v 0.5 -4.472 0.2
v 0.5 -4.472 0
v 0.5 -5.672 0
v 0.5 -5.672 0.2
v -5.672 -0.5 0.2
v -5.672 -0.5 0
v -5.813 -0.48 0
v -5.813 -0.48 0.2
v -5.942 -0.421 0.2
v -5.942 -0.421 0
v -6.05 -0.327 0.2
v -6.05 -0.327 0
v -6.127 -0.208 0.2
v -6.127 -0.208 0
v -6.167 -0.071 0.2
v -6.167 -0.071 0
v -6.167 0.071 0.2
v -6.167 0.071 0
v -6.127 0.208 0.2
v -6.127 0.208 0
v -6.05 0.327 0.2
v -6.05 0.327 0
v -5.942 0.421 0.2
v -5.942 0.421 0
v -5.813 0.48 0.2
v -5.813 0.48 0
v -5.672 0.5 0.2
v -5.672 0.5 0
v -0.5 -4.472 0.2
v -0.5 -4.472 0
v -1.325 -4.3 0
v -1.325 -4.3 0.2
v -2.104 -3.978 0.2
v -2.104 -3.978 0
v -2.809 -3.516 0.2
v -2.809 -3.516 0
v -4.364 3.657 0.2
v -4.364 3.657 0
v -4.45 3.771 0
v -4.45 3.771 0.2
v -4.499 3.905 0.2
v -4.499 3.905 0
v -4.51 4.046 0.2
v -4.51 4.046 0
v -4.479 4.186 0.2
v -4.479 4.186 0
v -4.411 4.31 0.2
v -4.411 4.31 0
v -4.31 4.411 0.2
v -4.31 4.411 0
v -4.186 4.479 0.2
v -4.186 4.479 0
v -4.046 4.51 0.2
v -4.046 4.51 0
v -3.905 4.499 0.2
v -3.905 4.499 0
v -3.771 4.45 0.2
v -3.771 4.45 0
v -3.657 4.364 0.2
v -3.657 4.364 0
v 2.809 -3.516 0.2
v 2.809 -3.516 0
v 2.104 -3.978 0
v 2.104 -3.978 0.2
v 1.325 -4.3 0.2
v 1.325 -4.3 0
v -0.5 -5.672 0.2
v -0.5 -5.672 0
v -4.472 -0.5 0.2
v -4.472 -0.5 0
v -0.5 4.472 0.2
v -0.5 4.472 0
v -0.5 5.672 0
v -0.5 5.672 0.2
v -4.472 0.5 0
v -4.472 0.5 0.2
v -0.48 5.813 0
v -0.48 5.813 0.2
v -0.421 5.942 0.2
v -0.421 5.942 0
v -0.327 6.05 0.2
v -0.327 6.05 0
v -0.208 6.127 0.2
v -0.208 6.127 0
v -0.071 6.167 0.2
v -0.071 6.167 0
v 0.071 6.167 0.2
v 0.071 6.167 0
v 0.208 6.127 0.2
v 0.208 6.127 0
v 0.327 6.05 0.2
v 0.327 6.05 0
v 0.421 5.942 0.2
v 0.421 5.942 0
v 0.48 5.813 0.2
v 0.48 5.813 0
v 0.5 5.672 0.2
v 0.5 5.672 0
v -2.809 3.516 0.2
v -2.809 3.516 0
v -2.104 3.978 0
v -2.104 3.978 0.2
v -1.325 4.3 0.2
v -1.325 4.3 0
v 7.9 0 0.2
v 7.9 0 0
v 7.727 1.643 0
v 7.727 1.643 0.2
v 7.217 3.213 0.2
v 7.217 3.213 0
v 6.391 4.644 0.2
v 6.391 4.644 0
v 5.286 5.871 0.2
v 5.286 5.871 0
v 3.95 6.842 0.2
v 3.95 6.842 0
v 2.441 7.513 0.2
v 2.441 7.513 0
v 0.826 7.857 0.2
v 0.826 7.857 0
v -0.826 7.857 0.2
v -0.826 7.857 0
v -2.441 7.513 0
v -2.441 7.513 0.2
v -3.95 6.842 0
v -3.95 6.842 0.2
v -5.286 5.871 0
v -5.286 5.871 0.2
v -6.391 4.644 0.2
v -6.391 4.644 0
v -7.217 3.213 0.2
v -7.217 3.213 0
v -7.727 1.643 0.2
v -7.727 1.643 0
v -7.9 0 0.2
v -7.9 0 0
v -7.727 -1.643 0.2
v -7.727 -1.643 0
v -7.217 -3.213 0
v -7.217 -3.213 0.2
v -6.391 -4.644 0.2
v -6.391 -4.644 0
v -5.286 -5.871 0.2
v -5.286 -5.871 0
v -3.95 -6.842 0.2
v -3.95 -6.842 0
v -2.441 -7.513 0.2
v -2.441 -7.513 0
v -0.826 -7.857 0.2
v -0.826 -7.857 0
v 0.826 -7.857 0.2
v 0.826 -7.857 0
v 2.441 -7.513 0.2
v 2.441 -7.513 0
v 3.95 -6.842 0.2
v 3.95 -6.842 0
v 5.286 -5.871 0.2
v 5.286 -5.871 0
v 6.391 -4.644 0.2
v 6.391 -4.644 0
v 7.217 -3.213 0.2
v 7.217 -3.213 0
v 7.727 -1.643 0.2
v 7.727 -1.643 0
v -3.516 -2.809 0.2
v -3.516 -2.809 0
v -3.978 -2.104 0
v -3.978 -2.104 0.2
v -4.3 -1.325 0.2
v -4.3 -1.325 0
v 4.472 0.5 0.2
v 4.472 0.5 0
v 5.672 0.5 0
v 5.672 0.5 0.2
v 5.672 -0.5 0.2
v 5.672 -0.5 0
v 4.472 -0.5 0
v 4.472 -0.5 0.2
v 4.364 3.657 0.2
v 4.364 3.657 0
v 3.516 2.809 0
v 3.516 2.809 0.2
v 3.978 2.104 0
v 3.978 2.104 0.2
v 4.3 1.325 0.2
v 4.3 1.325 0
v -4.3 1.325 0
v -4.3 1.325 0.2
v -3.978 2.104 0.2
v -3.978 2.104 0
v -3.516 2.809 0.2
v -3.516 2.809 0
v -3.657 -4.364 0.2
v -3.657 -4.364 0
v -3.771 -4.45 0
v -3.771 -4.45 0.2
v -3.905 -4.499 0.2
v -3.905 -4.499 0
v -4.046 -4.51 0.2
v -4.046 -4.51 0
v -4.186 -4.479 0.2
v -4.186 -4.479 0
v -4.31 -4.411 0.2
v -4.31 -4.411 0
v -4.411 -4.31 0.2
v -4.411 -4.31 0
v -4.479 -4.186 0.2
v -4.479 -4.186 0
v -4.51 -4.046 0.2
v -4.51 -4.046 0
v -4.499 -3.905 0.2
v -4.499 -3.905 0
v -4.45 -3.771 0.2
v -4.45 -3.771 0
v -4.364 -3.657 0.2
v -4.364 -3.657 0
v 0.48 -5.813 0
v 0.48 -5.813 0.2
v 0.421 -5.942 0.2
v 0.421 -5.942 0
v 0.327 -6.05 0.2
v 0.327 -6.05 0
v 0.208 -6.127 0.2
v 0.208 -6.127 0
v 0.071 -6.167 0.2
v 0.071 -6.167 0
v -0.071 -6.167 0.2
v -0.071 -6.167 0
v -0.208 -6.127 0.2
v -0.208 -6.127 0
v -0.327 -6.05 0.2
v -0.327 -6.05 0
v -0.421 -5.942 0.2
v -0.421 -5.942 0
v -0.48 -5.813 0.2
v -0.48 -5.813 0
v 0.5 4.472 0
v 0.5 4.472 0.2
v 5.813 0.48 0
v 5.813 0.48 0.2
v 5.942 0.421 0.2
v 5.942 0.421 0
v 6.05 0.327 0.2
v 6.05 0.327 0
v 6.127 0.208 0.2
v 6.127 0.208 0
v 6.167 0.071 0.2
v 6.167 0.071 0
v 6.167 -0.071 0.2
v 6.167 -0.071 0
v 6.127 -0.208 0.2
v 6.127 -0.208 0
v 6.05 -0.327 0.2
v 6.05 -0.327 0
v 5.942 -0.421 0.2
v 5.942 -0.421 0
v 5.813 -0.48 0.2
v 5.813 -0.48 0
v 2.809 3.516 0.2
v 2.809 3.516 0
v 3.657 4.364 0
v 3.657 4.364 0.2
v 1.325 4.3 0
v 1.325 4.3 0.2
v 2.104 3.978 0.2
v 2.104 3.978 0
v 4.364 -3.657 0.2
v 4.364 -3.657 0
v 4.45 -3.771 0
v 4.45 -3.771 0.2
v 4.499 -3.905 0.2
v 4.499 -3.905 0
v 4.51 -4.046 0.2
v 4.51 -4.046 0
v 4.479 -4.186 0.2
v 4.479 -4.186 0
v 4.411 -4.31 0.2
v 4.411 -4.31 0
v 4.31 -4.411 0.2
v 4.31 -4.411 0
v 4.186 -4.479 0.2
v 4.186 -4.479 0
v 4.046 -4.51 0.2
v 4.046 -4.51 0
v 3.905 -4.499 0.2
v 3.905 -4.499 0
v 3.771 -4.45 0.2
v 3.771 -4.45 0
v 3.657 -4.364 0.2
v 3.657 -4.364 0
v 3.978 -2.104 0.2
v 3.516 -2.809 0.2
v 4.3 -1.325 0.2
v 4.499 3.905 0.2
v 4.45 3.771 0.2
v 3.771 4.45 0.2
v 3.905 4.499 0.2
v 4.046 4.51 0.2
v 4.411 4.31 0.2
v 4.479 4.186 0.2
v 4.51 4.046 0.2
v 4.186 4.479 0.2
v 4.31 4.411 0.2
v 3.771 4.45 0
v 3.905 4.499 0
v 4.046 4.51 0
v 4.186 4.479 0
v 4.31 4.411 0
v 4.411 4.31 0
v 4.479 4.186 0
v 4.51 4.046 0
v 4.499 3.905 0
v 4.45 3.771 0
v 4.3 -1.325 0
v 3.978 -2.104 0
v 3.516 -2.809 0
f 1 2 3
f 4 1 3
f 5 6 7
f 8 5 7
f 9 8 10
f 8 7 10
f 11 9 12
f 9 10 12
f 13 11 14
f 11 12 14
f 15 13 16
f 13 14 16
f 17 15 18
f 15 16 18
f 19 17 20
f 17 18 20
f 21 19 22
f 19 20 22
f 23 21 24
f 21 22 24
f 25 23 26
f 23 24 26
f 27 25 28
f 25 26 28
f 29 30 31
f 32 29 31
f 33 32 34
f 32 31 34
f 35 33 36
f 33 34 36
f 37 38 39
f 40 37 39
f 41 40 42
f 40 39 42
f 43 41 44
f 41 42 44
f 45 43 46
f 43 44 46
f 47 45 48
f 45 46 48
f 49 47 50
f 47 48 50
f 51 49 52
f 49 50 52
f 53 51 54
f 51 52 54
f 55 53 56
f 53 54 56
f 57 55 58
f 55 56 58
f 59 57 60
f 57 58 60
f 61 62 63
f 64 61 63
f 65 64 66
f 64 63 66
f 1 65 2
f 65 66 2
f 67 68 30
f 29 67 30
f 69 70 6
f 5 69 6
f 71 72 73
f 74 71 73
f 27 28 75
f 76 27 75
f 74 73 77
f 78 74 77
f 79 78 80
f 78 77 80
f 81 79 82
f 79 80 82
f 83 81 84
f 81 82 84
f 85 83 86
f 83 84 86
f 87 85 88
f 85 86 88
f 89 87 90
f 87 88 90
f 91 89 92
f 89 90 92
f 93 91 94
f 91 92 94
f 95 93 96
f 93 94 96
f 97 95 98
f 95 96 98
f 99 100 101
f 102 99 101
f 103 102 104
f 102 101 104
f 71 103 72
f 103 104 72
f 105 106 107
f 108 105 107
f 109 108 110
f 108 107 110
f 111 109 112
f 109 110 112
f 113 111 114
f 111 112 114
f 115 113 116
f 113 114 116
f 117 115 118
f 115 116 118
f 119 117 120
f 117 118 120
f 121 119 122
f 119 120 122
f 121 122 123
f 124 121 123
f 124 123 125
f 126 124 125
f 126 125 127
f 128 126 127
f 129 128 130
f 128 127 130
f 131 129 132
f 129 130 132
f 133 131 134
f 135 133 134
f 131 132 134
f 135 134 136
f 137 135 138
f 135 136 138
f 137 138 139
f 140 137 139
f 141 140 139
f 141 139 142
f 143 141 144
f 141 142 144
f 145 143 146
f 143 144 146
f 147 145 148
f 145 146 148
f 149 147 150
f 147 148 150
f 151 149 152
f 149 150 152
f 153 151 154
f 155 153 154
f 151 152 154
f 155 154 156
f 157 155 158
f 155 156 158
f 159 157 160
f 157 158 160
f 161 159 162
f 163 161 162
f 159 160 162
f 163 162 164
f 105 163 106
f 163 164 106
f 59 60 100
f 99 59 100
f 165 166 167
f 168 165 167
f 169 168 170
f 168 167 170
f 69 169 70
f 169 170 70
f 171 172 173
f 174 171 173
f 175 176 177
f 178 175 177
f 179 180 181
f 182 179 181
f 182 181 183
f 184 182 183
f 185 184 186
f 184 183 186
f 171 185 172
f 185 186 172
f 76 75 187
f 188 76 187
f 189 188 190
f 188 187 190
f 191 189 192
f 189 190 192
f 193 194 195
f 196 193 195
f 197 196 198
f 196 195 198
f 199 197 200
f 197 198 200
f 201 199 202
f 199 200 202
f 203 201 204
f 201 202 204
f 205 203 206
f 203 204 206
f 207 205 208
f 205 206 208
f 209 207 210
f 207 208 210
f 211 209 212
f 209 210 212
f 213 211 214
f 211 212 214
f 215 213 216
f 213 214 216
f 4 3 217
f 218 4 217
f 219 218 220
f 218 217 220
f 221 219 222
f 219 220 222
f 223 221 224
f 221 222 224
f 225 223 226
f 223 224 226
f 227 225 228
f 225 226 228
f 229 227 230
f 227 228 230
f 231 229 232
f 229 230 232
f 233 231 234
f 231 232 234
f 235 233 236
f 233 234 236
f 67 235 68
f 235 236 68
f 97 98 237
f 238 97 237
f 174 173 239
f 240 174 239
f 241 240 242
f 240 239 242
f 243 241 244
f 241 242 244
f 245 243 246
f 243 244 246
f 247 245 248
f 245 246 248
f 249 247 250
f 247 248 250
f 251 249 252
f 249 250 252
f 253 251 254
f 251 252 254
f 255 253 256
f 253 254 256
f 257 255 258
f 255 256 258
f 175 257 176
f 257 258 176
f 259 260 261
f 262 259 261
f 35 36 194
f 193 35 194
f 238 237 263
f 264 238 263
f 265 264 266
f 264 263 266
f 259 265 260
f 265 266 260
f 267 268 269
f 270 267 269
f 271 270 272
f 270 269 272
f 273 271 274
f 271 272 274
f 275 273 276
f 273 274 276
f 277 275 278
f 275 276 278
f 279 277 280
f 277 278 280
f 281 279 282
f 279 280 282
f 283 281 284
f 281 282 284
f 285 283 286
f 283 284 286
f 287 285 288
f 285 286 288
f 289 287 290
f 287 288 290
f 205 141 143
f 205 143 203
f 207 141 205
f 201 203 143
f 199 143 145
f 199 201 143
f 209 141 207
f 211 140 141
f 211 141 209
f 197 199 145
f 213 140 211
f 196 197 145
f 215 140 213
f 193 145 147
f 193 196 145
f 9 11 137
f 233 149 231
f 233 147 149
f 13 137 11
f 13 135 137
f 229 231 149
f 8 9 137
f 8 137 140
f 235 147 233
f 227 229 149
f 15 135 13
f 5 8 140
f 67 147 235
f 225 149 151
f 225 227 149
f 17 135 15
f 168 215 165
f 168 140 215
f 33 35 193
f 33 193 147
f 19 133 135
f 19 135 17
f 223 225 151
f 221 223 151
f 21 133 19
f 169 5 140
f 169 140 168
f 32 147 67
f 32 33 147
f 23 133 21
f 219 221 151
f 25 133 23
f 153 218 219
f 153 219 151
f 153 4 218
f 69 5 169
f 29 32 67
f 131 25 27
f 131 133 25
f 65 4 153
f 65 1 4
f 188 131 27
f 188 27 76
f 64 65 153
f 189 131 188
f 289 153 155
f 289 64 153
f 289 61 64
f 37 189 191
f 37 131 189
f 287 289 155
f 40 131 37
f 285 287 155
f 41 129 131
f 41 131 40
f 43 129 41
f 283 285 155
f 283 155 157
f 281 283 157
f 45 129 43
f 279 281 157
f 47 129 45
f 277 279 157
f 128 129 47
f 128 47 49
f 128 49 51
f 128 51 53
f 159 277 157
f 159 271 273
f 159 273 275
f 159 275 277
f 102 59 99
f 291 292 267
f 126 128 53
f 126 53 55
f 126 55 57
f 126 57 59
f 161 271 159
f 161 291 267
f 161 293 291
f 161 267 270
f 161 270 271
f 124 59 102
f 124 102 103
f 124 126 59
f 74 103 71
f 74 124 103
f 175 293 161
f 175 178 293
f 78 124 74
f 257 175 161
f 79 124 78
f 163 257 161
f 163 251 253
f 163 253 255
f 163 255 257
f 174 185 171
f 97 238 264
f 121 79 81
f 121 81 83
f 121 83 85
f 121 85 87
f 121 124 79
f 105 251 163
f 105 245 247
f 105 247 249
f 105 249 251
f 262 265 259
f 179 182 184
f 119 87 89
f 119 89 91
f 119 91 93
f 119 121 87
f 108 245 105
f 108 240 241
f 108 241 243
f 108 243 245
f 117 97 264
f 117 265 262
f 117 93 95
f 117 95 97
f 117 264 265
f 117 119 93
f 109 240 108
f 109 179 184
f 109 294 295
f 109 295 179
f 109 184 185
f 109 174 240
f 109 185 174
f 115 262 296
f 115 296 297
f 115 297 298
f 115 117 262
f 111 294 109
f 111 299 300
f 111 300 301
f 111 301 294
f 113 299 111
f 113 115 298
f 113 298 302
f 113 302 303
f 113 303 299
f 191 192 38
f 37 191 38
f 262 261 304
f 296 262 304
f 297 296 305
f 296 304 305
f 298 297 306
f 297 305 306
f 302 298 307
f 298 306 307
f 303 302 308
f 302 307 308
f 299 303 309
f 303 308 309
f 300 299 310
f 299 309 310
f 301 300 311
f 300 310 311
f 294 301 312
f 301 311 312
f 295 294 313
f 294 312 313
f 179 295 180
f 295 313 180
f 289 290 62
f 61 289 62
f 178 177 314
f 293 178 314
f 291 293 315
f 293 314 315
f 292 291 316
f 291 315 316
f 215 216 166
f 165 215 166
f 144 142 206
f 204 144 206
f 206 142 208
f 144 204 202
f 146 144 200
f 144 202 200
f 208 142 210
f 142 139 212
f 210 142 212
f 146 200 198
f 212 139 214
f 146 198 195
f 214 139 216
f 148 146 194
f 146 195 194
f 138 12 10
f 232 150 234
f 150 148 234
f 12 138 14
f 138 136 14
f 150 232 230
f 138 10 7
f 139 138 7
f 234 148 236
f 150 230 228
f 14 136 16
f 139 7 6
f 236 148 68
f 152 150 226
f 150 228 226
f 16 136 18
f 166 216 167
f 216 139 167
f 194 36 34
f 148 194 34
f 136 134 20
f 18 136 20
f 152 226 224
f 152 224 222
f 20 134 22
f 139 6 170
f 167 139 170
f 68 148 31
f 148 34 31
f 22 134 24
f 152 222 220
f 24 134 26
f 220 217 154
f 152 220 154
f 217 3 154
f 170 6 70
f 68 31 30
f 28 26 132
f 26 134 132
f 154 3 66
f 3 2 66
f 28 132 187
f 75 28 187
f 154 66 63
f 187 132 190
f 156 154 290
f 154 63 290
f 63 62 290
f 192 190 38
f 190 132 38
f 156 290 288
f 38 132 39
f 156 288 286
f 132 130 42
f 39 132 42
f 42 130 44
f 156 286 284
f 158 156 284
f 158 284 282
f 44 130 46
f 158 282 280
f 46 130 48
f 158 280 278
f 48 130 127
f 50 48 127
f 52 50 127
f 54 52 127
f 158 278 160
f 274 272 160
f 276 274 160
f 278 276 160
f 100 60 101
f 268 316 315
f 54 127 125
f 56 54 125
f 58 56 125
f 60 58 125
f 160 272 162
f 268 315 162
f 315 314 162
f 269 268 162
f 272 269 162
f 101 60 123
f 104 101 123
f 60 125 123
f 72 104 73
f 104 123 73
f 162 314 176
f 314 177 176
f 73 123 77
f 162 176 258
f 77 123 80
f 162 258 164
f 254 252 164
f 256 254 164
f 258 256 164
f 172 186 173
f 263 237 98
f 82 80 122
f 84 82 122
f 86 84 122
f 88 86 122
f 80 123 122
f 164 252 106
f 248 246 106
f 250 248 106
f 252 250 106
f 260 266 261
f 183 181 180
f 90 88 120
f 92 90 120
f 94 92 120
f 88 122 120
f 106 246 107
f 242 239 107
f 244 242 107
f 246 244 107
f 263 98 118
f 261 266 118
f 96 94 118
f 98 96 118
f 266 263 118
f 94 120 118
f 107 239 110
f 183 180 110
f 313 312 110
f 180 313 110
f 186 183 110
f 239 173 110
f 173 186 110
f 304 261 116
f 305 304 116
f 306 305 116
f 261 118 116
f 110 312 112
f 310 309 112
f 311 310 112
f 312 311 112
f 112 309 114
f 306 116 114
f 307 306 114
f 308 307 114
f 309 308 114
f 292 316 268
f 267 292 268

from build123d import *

# Parameters (mm, degrees)
F0_R     = 7.9
F1_DEPTH = 0.2


with BuildPart() as f1:
    # F0 (on Top) → F1 (new body)
    with BuildSketch(Plane.XY):
        Circle(F0_R)
        with BuildLine():
            ThreePointArc((-2.808724, 3.515831), (-1.722075, 4.157458), (-0.5, 4.472136))
            Line((-0.5, 4.472136), (-0.5, 5.672136))
            ThreePointArc((-0.5, 5.672136), (0, 6.172136), (0.5, 5.672136))
            Line((0.5, 5.672136), (0.5, 4.472136))
            ThreePointArc((0.5, 4.472136), (1.722075, 4.157458), (2.808724, 3.515831))
            Line((2.808724, 3.515831), (3.657252, 4.364359))
            ThreePointArc((3.657252, 4.364359), (4.364359, 4.364359), (4.364359, 3.657252))
            Line((4.364359, 3.657252), (3.515831, 2.808724))
            ThreePointArc((3.515831, 2.808724), (4.157458, 1.722075), (4.472136, 0.5))
            Line((4.472136, 0.5), (5.672136, 0.5))
            ThreePointArc((5.672136, 0.5), (6.172136, 0), (5.672136, -0.5))
            Line((5.672136, -0.5), (4.472136, -0.5))
            ThreePointArc((4.472136, -0.5), (4.157458, -1.722075), (3.515831, -2.808724))
            Line((3.515831, -2.808724), (4.364359, -3.657252))
            ThreePointArc((4.364359, -3.657252), (4.364359, -4.364359), (3.657252, -4.364359))
            Line((3.657252, -4.364359), (2.808724, -3.515831))
            ThreePointArc((2.808724, -3.515831), (1.722075, -4.157458), (0.5, -4.472136))
            Line((0.5, -4.472136), (0.5, -5.672136))
            ThreePointArc((0.5, -5.672136), (0, -6.172136), (-0.5, -5.672136))
            Line((-0.5, -5.672136), (-0.5, -4.472136))
            ThreePointArc((-0.5, -4.472136), (-1.722075, -4.157458), (-2.808724, -3.515831))
            Line((-2.808724, -3.515831), (-3.657252, -4.364359))
            ThreePointArc((-3.657252, -4.364359), (-4.364359, -4.364359), (-4.364359, -3.657252))
            Line((-4.364359, -3.657252), (-3.515831, -2.808724))
            ThreePointArc((-3.515831, -2.808724), (-4.157458, -1.722075), (-4.472136, -0.5))
            Line((-4.472136, -0.5), (-5.672136, -0.5))
            ThreePointArc((-5.672136, -0.5), (-6.172136, 0), (-5.672136, 0.5))
            Line((-5.672136, 0.5), (-4.472136, 0.5))
            ThreePointArc((-4.472136, 0.5), (-4.157458, 1.722075), (-3.515831, 2.808724))
            Line((-3.515831, 2.808724), (-4.364359, 3.657252))
            ThreePointArc((-4.364359, 3.657252), (-4.364359, 4.364359), (-3.657252, 4.364359))
            Line((-3.657252, 4.364359), (-2.808724, 3.515831))
        make_face(mode=Mode.SUBTRACT)
    extrude(amount=F1_DEPTH)


solid = f1.part
